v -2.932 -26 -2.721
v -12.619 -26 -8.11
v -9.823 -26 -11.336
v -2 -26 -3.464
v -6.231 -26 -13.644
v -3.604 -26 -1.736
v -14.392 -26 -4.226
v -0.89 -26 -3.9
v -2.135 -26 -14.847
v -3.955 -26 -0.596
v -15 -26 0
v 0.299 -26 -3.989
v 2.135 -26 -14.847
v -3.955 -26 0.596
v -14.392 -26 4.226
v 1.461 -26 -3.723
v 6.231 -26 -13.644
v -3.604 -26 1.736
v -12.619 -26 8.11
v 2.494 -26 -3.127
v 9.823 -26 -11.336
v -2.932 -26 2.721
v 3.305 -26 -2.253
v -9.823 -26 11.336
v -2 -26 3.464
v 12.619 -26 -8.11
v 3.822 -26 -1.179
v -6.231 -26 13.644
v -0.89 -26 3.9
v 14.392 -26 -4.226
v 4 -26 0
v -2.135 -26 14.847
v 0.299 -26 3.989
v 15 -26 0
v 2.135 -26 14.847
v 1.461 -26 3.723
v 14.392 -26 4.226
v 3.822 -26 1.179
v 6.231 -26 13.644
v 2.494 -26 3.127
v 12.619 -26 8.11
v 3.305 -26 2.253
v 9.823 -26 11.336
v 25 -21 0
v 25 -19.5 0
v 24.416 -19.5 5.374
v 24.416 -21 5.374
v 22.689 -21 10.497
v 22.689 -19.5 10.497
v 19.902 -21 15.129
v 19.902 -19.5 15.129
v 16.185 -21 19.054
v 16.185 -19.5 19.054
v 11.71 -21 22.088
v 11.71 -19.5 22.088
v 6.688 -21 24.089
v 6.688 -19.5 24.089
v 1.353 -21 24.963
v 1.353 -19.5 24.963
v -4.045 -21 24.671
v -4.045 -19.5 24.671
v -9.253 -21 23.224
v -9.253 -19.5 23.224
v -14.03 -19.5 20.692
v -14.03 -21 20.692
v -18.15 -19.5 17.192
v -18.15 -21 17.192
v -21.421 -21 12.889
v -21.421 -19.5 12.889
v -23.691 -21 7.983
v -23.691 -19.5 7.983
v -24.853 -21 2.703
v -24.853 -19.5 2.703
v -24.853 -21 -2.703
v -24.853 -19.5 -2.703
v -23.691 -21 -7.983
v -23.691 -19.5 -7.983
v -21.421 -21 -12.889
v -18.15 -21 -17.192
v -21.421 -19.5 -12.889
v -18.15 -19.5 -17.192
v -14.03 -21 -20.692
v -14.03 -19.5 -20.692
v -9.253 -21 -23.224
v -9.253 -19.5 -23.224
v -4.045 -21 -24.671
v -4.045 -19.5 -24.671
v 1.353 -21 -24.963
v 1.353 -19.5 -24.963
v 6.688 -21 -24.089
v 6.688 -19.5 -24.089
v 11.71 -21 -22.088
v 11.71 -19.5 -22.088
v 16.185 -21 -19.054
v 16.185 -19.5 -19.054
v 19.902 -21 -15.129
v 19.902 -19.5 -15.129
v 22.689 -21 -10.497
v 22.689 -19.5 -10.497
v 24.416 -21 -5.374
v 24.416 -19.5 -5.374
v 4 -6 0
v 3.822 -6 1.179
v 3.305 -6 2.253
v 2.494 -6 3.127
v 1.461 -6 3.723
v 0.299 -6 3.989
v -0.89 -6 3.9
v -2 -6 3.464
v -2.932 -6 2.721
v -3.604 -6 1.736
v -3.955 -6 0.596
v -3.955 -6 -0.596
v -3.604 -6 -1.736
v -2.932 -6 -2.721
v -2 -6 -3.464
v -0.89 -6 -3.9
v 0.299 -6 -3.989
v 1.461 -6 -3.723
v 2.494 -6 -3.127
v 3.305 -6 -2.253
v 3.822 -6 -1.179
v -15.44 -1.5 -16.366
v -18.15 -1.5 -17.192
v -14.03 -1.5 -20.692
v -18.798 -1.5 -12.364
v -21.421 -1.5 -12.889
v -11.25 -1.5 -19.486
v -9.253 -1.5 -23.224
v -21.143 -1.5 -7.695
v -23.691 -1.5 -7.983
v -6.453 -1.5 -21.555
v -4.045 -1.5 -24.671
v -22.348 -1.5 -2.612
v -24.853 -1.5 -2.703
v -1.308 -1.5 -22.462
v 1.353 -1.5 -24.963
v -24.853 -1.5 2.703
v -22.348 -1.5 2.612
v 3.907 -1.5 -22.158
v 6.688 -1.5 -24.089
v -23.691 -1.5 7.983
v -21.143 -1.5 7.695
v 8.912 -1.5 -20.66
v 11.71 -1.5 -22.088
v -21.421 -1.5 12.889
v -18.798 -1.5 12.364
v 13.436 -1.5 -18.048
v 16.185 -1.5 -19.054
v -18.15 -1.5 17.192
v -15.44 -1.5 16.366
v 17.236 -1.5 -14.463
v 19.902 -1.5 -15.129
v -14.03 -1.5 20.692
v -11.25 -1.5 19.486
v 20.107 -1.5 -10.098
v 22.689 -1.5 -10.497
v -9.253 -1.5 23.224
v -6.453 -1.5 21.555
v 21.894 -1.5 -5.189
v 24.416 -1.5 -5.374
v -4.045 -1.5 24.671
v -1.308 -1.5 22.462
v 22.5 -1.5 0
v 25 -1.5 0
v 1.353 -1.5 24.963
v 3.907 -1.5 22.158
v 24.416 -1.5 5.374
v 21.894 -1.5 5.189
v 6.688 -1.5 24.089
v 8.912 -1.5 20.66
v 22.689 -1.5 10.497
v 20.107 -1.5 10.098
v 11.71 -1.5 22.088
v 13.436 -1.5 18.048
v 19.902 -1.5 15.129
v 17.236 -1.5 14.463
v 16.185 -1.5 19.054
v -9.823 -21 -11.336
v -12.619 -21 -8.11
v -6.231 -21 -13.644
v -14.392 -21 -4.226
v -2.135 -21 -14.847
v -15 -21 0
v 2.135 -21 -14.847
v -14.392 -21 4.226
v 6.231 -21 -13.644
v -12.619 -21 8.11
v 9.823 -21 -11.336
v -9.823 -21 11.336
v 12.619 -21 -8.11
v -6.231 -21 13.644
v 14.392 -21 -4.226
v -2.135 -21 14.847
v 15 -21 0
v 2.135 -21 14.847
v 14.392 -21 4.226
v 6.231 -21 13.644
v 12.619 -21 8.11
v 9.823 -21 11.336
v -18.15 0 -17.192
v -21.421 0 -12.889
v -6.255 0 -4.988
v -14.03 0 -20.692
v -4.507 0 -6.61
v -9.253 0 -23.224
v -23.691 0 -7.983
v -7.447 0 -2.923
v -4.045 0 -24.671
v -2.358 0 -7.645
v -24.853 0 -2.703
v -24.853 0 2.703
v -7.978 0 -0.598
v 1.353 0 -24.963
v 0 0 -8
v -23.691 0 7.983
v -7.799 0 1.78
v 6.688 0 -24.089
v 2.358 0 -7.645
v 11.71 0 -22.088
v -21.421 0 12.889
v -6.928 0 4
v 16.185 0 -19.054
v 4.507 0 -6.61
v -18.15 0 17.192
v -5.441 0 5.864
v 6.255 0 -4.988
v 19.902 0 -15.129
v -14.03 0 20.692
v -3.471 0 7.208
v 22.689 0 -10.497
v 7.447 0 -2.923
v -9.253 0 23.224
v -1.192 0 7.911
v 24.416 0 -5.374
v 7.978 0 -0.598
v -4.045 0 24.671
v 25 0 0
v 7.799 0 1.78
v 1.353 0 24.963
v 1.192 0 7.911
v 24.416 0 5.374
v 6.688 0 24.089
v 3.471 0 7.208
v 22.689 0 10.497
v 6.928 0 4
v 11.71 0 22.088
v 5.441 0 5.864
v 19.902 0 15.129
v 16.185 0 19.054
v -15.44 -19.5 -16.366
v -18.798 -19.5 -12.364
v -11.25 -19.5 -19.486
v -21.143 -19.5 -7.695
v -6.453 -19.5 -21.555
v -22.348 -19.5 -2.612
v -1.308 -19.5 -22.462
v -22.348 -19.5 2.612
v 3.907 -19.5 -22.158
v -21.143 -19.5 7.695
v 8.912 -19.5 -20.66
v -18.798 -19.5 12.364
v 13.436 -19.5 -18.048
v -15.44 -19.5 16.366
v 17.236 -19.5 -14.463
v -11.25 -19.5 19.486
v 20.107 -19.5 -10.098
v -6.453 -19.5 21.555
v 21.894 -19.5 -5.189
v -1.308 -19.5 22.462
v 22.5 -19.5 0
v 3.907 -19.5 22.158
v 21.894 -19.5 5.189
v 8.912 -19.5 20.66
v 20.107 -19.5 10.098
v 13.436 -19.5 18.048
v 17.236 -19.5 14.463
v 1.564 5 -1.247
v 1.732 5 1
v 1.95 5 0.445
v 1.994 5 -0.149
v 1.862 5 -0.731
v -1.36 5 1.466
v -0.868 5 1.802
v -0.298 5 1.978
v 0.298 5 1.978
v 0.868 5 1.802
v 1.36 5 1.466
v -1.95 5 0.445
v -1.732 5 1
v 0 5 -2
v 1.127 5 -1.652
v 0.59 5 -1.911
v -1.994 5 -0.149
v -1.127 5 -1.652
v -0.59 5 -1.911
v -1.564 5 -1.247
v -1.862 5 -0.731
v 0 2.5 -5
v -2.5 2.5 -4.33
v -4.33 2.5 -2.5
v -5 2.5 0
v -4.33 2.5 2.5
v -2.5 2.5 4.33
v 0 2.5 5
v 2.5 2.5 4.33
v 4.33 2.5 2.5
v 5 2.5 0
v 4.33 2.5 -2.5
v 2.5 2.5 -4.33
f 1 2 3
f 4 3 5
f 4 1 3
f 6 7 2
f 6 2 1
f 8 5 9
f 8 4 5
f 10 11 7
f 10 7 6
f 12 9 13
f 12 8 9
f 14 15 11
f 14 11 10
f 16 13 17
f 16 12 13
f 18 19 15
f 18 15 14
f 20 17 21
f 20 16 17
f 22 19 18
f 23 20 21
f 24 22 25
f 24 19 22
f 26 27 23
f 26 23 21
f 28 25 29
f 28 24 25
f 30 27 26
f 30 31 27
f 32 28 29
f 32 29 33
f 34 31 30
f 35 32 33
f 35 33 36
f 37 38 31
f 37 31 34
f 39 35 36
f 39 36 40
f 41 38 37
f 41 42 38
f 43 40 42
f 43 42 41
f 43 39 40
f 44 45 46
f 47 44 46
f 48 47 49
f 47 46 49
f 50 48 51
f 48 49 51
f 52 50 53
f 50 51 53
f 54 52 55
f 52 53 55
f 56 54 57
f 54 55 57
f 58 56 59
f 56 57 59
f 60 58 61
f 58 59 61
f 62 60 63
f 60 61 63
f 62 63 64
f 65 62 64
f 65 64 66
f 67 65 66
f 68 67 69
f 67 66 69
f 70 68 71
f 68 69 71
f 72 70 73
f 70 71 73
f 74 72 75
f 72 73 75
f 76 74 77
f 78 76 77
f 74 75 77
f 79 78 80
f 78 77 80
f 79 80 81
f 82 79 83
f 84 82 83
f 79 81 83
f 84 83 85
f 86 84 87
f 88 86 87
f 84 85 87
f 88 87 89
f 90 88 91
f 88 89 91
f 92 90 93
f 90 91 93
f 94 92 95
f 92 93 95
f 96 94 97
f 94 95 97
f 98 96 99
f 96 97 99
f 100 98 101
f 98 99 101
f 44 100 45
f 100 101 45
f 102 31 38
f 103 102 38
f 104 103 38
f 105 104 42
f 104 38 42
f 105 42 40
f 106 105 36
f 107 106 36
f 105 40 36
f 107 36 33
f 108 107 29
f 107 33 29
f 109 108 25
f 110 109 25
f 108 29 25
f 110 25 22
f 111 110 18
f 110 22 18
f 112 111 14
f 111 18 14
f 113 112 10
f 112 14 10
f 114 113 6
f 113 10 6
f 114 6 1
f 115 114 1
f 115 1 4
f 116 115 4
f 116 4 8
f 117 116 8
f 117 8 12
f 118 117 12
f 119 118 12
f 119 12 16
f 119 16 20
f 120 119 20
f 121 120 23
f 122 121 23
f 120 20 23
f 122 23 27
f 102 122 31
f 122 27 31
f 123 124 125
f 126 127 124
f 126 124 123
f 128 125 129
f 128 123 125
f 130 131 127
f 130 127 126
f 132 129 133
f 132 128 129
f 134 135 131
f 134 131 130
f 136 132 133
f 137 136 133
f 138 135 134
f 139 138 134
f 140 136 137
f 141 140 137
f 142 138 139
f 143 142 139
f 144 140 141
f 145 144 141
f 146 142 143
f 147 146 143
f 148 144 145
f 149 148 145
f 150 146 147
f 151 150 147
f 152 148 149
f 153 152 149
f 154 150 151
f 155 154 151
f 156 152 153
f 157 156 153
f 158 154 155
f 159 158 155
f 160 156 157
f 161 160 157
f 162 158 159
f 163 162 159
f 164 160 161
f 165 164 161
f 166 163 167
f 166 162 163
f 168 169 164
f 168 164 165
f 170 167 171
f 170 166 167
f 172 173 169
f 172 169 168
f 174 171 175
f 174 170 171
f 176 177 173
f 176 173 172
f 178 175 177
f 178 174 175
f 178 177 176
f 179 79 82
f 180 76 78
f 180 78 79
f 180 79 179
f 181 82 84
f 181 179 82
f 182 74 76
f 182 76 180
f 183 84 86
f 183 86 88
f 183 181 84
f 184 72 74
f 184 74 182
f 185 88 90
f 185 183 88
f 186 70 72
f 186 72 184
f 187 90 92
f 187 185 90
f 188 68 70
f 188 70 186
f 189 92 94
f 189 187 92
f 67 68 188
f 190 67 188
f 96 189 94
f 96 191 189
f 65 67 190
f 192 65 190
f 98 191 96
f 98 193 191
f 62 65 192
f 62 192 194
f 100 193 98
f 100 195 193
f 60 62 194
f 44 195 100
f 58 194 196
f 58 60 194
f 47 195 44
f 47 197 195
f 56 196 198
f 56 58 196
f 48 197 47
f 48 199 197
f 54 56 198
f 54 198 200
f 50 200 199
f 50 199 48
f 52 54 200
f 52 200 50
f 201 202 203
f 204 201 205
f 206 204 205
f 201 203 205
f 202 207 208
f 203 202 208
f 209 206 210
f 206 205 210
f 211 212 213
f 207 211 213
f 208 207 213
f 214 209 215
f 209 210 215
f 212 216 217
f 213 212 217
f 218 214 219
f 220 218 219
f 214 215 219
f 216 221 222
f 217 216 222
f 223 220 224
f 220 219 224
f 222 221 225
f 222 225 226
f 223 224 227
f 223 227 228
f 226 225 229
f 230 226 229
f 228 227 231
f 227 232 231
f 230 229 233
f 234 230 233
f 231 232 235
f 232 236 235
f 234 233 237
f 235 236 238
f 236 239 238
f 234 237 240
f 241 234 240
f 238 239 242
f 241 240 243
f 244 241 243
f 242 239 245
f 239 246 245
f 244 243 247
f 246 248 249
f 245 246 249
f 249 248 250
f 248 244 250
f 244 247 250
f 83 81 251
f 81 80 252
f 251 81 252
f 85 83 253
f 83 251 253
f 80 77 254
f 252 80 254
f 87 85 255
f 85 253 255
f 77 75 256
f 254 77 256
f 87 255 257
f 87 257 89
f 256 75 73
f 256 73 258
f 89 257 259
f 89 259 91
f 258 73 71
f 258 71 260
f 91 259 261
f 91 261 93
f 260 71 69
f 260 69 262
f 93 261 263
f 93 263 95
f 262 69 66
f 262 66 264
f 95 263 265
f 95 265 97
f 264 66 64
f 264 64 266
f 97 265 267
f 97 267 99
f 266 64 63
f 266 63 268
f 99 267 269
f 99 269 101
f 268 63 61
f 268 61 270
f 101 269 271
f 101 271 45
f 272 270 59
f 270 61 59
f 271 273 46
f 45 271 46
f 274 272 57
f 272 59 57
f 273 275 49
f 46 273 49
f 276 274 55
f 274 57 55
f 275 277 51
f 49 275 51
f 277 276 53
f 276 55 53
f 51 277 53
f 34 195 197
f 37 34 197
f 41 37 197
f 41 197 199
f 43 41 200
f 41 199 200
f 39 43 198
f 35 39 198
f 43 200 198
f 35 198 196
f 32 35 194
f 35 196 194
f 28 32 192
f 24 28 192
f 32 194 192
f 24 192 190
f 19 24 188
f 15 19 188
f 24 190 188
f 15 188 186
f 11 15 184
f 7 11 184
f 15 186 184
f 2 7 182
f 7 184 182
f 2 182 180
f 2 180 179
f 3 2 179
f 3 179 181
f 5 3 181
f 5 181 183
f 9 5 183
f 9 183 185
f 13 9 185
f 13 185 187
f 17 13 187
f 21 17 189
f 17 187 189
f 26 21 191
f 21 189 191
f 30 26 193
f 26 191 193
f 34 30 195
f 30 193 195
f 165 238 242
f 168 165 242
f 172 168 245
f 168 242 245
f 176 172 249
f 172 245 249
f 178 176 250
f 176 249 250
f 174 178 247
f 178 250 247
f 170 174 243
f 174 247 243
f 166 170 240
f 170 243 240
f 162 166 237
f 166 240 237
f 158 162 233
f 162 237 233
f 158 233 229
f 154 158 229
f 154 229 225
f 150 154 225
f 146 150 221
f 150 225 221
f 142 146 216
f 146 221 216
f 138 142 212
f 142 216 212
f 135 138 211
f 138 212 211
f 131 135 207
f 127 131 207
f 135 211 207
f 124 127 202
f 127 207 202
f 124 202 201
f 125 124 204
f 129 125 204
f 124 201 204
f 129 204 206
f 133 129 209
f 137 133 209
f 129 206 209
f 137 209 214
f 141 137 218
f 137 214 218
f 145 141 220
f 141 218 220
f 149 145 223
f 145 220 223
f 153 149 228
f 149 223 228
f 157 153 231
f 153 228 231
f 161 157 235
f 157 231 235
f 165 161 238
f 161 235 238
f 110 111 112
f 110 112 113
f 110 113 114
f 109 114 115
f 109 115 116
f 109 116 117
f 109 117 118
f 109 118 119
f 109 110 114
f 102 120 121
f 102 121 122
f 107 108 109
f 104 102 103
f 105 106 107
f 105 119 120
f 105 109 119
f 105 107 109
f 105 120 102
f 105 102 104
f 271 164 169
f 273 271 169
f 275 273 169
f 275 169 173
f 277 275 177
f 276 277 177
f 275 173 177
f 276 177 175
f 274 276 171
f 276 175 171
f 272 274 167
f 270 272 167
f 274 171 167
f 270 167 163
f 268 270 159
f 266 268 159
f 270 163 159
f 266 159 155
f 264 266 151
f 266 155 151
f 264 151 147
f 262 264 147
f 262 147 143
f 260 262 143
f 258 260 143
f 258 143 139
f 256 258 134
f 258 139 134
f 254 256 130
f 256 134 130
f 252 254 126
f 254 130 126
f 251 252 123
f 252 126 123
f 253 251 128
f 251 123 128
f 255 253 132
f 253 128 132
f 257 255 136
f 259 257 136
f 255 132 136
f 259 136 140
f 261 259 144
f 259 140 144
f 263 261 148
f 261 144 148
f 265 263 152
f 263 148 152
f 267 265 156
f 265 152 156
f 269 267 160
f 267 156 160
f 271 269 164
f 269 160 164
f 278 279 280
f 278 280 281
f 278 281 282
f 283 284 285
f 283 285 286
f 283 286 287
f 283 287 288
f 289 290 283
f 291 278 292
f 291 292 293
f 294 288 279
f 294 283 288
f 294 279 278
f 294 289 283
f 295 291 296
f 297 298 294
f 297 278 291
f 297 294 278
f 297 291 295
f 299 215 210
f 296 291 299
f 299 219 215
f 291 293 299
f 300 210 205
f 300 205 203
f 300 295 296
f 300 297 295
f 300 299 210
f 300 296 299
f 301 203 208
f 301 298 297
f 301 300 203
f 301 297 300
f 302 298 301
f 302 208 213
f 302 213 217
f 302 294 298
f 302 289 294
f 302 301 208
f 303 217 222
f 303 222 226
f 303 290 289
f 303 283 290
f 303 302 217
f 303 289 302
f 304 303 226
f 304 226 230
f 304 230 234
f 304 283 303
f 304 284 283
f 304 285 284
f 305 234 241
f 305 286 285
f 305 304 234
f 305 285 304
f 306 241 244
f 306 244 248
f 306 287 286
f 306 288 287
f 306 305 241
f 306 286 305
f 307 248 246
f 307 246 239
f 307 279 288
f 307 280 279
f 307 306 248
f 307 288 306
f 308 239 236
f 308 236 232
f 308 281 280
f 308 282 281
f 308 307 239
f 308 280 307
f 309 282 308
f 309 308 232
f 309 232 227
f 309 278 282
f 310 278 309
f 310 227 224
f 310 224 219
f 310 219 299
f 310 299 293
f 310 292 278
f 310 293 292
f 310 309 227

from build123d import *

# Parameters (mm, degrees)
F0_R      = 25
F1_DEPTH  = 1.5
F2_R      = 22.5
F3_DEPTH  = 18
F4_R      = 25
F5_DEPTH  = 1.5
F6_R      = 15
F7_DEPTH  = 5
F10_R     = 4
F11_DEPTH = 20


with BuildPart() as f1:
    # F0 (on Front) → F1 (new body)
    with BuildSketch(Plane.XZ):
        Circle(F0_R)
    extrude(amount=F1_DEPTH)

    # F2 (on face) → F3 (join)
    with BuildSketch(Plane.XZ.offset(1.5)):
        Circle(F2_R)
    extrude(amount=F3_DEPTH)

    # F4 (on face) → F5 (join)
    with BuildSketch(Plane.XZ.offset(19.5)):
        Circle(F4_R)
    extrude(amount=F5_DEPTH)

    # F6 (on face) → F7 (join)
    with BuildSketch(Plane.XZ.offset(21)):
        Circle(F6_R)
    extrude(amount=F7_DEPTH)

    # F8 (on Right) → F9 (revolve)
    with BuildSketch(Plane.YZ):
        Polygon((5, 0), (0, 0), (0, -8), (5, -2), align=None)
    revolve(axis=Axis((0, 10.197903, 0), (0, 1, 0)))

    # F10 (on face) → F11 (cut)
    with BuildSketch(Plane.XZ.offset(26)):
        Circle(F10_R)
    extrude(amount=-F11_DEPTH, mode=Mode.SUBTRACT)


solid = f1.part
